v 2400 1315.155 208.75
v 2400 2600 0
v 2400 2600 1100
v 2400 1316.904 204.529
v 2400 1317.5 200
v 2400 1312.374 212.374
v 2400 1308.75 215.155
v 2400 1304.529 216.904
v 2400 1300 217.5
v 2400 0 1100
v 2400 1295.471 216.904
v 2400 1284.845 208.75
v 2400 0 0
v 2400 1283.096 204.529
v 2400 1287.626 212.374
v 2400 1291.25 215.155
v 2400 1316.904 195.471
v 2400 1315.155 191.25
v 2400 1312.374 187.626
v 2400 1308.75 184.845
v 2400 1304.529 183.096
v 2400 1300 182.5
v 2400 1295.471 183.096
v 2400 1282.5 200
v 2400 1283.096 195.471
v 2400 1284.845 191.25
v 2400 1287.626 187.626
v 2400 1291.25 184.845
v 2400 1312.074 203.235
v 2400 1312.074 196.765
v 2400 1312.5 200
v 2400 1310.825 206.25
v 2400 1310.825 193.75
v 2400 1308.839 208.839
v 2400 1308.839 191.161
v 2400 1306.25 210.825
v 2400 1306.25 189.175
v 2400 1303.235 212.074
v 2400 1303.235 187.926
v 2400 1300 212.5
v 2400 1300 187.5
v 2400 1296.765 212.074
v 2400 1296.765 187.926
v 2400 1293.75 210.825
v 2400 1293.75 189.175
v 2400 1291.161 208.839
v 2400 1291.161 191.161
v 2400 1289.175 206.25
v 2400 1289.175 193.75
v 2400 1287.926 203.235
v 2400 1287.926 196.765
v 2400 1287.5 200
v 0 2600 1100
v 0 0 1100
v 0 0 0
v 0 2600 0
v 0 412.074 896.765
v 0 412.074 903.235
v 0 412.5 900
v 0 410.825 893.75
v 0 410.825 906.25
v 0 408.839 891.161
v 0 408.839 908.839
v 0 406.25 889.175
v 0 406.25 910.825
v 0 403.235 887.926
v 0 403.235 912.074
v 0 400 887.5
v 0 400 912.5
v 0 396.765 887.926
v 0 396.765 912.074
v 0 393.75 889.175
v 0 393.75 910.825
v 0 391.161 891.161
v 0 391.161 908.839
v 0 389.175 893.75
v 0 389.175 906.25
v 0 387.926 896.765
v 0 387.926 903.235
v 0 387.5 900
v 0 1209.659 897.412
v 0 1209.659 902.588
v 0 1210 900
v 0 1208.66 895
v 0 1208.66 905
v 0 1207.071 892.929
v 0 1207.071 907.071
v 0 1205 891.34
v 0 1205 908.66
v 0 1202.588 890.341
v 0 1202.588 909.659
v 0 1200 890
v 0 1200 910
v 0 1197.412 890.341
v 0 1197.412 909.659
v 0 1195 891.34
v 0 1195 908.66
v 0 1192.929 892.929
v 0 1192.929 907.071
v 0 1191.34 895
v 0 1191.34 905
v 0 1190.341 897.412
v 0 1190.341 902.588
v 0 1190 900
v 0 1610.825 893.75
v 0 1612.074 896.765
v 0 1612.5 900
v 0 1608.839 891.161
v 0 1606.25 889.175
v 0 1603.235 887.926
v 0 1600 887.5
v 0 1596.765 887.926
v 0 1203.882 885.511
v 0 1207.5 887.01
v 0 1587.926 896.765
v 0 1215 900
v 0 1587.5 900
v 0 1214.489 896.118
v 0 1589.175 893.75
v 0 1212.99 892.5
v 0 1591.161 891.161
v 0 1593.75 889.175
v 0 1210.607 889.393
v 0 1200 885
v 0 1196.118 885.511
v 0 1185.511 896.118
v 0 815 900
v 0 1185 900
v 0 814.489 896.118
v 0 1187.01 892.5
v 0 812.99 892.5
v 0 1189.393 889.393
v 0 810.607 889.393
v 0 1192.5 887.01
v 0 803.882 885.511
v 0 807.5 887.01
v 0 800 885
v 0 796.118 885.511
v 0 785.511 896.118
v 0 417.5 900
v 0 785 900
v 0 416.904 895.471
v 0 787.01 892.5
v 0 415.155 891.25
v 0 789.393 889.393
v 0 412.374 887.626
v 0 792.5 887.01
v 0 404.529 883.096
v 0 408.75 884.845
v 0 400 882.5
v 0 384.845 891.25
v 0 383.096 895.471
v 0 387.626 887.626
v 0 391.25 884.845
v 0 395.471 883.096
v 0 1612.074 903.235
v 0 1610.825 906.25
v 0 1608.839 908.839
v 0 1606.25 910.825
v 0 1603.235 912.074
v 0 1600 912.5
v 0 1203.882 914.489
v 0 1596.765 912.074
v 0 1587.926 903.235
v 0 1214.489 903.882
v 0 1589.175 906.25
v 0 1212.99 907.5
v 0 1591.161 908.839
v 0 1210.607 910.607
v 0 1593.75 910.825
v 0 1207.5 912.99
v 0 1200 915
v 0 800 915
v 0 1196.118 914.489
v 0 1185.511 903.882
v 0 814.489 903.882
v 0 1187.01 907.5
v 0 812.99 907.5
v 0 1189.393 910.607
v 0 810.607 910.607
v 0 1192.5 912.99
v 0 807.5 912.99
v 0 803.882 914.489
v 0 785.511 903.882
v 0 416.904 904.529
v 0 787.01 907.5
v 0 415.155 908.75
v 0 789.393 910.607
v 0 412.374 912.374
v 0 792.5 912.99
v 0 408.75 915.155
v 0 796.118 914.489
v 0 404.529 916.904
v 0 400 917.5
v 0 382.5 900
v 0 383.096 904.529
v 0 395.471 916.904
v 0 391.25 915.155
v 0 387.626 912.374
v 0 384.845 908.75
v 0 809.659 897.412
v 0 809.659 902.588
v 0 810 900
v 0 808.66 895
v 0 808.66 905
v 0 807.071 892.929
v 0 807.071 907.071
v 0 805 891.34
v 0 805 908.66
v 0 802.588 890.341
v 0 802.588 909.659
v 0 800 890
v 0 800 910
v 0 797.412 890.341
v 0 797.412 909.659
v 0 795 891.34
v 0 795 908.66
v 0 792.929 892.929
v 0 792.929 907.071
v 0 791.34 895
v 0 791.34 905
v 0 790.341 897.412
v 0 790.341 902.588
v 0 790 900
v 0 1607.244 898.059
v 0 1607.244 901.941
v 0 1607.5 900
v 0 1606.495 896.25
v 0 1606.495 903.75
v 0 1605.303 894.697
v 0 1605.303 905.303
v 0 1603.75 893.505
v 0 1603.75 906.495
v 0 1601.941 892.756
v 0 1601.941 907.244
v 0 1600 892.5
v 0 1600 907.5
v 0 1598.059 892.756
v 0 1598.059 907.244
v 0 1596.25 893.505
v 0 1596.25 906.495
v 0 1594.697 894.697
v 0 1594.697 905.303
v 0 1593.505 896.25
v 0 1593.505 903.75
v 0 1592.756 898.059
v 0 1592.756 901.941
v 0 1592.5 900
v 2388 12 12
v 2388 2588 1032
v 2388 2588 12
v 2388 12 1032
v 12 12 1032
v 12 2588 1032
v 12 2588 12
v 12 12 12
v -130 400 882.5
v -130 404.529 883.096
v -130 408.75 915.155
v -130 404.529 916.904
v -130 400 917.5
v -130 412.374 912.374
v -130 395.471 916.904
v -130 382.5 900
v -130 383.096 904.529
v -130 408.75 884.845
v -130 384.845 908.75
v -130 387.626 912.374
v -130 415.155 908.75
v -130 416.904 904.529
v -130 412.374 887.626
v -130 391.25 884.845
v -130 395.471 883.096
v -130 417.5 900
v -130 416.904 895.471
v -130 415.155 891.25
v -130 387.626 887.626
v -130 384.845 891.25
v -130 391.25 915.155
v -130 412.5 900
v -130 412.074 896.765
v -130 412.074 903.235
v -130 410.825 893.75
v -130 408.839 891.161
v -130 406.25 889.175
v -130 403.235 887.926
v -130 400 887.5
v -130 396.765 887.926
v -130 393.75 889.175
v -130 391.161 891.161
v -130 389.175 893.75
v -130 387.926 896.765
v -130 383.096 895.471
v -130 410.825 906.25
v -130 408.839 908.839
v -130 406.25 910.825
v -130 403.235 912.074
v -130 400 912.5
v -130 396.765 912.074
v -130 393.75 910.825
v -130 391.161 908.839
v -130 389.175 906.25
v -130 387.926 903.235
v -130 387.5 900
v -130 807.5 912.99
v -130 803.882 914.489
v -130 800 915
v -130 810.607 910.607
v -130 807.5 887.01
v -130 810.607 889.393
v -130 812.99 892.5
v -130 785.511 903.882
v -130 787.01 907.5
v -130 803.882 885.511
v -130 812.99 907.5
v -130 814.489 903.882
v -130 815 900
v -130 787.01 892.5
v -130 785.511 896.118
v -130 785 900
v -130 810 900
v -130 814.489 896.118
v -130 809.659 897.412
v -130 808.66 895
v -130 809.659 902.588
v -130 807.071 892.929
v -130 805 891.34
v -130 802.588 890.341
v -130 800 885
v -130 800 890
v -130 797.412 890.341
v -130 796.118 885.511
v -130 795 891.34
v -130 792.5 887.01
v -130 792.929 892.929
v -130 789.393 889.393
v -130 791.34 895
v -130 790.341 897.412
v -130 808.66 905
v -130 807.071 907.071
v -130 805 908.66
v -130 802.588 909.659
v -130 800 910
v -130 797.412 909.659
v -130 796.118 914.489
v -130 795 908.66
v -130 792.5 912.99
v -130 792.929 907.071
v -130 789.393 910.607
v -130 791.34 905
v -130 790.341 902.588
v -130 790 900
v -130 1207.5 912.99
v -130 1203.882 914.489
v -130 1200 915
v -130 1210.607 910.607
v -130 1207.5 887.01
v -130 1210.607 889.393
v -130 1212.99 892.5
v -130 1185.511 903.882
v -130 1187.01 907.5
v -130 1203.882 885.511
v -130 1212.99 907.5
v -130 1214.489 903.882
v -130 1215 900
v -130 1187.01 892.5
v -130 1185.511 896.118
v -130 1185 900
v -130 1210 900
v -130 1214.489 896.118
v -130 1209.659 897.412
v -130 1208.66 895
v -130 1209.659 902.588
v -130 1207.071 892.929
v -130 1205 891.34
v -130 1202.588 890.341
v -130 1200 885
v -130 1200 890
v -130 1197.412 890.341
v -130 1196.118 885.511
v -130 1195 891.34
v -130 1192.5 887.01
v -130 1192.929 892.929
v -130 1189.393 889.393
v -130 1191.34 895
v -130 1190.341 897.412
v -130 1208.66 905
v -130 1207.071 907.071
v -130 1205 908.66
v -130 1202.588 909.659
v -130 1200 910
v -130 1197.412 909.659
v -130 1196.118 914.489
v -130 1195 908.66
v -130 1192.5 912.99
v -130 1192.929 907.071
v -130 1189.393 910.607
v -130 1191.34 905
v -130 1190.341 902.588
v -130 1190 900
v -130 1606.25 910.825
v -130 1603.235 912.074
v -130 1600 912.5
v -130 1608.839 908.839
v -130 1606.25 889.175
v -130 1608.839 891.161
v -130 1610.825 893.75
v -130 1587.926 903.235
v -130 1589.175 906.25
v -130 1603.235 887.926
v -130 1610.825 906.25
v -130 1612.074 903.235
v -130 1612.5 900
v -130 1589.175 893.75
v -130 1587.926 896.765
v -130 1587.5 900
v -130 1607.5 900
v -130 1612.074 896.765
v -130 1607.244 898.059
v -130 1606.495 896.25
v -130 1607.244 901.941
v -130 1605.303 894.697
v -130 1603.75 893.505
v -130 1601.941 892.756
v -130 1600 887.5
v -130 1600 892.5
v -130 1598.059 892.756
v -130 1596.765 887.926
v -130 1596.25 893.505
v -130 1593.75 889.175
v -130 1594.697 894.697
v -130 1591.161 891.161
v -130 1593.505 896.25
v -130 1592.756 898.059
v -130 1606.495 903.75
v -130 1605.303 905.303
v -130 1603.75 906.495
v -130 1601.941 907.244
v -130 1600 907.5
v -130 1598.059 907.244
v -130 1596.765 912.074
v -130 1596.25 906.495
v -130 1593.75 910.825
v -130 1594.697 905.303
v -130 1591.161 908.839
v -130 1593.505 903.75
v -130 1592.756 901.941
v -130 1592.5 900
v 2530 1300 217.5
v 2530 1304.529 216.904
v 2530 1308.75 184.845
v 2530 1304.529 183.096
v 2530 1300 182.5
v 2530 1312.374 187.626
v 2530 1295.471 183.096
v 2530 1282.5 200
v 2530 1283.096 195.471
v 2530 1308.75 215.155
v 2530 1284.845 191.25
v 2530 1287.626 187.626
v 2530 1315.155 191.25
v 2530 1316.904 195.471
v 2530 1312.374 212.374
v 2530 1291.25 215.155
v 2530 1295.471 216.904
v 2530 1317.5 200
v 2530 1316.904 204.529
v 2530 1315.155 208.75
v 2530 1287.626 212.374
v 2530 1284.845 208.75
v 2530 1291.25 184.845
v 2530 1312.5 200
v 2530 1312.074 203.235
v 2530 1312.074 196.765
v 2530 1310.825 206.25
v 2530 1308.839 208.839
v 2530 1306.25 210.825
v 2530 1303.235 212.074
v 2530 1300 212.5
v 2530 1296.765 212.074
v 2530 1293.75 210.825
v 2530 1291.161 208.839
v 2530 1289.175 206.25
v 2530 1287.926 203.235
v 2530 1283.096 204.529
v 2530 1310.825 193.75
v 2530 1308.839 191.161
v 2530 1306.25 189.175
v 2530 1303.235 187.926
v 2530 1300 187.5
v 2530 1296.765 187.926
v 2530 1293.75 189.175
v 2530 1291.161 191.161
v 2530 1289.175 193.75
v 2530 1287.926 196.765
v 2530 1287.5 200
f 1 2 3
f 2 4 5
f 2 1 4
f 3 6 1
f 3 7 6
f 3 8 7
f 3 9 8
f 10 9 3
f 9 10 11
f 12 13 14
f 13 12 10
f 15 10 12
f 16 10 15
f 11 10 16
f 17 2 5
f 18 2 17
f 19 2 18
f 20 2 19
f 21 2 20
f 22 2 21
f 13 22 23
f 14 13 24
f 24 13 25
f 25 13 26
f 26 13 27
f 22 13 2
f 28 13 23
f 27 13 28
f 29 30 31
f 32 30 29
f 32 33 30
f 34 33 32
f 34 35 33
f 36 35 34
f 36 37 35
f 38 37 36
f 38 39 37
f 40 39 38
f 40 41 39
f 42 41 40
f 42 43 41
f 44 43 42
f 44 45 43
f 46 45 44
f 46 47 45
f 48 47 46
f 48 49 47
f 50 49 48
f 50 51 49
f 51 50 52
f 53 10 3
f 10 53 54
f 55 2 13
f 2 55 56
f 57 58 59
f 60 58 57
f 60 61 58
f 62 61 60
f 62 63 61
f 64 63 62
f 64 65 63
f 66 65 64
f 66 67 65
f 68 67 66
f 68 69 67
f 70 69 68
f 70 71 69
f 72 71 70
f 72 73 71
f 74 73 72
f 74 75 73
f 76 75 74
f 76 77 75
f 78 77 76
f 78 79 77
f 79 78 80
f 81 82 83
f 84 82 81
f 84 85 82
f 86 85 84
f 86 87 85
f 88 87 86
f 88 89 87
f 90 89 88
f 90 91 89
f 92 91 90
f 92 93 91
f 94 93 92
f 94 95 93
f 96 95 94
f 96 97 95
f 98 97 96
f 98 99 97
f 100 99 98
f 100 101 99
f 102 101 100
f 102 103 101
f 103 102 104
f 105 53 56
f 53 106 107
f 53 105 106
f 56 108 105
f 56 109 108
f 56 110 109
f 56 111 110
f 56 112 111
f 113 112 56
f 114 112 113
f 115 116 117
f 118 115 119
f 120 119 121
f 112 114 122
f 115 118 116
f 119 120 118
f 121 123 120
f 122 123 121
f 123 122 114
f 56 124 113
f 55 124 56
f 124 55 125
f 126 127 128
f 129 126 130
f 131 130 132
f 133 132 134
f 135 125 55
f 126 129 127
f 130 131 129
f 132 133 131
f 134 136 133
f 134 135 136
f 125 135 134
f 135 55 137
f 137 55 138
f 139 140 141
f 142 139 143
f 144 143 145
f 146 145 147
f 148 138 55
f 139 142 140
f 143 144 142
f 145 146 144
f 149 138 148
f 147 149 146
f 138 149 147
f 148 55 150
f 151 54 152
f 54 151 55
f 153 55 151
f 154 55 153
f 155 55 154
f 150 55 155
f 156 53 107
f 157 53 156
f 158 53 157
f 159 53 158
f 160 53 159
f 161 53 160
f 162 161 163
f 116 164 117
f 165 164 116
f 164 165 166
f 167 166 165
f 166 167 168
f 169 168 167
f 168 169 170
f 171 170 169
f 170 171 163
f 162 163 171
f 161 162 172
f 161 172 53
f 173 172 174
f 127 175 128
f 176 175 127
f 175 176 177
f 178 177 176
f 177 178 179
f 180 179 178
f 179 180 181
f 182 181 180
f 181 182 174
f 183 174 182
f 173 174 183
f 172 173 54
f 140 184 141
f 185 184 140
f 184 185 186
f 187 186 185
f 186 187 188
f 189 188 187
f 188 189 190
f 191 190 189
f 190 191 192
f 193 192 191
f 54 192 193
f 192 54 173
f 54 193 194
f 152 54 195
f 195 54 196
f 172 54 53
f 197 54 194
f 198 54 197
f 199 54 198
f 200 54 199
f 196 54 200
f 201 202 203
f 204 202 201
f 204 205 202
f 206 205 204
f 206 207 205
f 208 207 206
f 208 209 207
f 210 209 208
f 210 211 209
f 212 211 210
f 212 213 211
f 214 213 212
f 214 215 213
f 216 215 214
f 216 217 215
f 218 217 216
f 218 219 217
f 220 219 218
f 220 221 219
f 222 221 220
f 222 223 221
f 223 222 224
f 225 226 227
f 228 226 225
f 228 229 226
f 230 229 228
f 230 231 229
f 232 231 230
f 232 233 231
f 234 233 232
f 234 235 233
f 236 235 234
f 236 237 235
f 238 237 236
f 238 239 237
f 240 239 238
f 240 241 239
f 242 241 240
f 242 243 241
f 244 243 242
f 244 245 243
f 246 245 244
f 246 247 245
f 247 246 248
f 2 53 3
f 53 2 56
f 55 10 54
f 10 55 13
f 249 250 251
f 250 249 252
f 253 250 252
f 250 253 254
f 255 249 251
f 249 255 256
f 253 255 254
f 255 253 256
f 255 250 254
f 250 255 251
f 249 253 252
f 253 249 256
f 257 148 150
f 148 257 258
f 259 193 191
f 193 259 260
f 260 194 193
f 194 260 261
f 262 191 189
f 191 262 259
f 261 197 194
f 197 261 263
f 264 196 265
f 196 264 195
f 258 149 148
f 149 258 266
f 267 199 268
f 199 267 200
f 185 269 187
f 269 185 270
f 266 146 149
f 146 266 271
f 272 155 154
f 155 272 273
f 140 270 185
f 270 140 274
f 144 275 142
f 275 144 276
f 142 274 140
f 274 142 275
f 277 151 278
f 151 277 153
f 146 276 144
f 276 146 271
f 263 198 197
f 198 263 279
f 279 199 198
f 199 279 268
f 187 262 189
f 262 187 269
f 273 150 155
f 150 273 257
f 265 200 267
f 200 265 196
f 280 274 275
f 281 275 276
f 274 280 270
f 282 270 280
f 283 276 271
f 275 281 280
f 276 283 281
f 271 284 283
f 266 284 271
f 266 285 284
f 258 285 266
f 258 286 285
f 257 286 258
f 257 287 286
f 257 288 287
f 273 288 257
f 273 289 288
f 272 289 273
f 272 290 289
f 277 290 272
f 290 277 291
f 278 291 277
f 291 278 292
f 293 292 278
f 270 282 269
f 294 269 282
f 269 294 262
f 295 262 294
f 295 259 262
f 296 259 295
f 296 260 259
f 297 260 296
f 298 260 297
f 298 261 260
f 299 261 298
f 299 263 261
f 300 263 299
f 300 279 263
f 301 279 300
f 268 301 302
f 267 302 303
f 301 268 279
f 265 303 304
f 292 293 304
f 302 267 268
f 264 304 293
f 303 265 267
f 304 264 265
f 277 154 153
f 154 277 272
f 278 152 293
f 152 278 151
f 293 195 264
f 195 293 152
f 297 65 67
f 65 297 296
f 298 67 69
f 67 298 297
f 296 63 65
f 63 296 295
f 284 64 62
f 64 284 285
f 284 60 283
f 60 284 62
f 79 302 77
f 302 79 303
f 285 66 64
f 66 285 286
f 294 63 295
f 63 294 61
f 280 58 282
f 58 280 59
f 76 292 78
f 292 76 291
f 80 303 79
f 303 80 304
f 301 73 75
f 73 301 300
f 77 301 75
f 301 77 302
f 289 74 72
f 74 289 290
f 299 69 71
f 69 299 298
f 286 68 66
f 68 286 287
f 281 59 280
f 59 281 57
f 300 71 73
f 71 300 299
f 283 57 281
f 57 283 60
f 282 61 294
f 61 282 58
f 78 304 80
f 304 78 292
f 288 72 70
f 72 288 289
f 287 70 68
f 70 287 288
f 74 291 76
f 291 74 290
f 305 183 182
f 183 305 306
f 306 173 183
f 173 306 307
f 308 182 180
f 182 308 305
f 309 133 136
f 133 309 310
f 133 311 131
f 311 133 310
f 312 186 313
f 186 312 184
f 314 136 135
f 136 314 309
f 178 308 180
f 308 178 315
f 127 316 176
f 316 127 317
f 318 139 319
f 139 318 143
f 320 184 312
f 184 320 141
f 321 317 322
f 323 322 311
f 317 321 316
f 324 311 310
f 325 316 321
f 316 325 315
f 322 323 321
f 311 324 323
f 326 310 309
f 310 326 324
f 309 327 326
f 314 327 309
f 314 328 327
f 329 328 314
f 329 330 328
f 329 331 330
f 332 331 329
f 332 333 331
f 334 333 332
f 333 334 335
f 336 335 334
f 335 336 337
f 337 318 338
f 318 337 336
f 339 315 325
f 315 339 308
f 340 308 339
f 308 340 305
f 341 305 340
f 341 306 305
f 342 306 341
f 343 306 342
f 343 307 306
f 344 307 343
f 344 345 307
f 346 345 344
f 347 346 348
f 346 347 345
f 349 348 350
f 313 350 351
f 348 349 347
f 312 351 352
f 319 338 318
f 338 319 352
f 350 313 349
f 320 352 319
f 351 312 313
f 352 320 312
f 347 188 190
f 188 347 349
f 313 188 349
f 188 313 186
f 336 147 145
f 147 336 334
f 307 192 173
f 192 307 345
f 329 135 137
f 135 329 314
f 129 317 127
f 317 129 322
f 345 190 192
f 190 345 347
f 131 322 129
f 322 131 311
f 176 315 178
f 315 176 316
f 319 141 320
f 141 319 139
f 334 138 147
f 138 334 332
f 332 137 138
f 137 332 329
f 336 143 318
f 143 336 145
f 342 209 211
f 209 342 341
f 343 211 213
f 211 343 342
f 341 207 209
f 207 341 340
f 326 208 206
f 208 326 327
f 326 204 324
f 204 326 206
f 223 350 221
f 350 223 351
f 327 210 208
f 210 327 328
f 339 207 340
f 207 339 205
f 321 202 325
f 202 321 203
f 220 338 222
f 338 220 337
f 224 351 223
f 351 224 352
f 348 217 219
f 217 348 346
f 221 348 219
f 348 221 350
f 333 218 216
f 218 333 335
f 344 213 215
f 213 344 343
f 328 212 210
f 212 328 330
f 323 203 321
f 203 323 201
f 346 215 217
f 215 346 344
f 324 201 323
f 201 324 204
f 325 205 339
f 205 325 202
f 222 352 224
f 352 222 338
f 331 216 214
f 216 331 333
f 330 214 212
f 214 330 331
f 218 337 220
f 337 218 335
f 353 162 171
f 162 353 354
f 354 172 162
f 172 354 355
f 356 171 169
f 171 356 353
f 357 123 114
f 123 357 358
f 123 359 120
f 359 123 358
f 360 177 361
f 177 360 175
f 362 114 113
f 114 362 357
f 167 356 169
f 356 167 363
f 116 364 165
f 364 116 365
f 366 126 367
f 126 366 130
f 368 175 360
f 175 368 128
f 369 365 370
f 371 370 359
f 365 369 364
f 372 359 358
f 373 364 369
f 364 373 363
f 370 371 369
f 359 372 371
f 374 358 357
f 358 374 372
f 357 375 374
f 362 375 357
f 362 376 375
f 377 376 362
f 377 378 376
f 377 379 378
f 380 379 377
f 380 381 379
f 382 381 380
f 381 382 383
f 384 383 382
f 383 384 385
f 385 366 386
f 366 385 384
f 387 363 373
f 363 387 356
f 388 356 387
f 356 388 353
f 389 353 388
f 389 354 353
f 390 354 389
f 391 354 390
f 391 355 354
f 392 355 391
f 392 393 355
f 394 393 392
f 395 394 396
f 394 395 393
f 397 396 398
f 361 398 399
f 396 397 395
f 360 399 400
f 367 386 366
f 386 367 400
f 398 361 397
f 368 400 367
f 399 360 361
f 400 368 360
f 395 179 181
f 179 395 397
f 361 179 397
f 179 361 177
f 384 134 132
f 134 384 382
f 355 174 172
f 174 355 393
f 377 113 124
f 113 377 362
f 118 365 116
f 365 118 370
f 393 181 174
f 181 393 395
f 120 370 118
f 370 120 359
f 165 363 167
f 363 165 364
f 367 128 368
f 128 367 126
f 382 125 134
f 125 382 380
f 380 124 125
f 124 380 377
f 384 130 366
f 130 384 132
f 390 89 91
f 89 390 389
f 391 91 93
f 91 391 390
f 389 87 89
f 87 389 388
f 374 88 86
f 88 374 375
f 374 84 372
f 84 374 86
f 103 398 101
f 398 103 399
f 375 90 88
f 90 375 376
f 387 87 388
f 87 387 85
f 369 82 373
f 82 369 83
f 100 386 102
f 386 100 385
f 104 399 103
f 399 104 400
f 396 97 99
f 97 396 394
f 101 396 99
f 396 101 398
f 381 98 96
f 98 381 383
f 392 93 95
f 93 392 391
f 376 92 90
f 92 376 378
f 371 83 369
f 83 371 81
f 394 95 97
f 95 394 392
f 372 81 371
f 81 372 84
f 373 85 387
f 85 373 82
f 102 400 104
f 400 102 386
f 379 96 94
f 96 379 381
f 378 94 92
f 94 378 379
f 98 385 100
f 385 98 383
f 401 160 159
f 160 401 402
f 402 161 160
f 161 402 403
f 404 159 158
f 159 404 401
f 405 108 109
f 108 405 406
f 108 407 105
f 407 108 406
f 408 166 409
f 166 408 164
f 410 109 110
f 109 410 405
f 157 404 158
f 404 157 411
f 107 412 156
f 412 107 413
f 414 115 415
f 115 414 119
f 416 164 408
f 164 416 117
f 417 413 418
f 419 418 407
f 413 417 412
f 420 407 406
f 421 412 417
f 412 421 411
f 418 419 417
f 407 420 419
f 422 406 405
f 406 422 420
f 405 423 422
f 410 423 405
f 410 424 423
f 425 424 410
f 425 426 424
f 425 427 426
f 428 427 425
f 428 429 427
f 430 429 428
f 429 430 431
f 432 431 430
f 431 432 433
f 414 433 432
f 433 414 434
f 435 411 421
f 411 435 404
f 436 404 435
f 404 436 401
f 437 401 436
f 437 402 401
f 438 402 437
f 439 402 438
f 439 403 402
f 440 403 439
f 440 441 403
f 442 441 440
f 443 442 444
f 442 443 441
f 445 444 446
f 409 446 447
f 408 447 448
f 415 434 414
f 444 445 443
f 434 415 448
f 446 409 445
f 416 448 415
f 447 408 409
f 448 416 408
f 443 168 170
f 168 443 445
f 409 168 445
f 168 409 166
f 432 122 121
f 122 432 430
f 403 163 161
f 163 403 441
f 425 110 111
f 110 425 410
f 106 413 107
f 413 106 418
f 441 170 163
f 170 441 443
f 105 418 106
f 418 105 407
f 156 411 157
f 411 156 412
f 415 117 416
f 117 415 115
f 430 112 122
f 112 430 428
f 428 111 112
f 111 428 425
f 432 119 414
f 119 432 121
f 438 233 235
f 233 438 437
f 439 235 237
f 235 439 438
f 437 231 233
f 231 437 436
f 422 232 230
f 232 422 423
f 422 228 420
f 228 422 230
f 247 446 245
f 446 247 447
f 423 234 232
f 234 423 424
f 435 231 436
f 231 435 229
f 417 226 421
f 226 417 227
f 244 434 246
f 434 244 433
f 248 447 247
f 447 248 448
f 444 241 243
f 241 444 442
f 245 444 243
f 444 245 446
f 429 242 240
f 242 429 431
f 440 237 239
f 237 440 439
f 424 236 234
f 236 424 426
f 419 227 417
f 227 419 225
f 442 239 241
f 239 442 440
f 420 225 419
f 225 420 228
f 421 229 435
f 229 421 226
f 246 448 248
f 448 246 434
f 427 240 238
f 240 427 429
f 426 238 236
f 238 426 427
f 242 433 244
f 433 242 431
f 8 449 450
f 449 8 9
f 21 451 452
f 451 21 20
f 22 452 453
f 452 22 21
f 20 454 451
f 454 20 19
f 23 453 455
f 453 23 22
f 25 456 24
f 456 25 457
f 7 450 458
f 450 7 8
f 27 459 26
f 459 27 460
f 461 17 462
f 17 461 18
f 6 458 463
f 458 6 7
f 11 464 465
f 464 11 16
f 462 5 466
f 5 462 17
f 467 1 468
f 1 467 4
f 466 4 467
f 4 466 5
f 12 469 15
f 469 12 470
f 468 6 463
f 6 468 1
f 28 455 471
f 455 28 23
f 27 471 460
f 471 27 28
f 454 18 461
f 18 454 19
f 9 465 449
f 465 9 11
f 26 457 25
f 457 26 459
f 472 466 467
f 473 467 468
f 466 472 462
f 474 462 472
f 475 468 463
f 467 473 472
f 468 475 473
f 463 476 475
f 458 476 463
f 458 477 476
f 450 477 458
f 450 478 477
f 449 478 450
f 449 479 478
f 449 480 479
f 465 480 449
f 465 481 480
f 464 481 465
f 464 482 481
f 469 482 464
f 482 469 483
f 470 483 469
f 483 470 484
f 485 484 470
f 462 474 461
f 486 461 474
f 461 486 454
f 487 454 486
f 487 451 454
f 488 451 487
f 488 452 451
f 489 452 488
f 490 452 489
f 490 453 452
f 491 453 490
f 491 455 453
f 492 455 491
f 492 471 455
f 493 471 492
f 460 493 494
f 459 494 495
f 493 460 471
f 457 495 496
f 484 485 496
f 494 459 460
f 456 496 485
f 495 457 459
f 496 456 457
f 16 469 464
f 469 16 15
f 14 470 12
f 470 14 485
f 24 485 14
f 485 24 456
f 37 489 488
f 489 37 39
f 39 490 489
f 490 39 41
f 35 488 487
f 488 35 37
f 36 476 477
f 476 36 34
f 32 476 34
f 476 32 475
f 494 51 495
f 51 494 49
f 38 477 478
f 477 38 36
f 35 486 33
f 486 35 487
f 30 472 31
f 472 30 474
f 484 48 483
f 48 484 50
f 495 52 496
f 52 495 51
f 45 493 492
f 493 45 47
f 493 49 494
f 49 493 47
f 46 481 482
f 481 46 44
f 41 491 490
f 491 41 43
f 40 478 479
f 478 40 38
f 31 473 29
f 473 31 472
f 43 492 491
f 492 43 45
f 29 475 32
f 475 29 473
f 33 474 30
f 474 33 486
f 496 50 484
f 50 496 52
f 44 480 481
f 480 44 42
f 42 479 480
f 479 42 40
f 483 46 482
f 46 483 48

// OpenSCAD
// file: ../params.scad
// Shared millimetre parameters. Keep in lockstep with freecad/params.py.
// Module scale: 150 kg/day wet train. Walls are CPVC sheet, not metal.

$fn = 36;

WALL        = 12;     // CPVC sheet thickness
FLOOR       = 16;     // floor plate (trough sits on this)

// LEACH CSTR 1 — inside liquor box
CSTR_L      = 2000;
CSTR_W      = 1200;
CSTR_H      = 1400;   // liquid + freeboard
FREEBOARD   = 200;

// CSTR 2 weir (same vessel, +X wall)
WEIR_W      = 450;
WEIR_CREST  = CSTR_H - FREEBOARD;   // from inner floor
WEIR_SLOT_H = 80;
WEIR_LIP    = 120;    // external spout projection

// CSTR 3 floor auger — injection-molded PVC / FG
AUGER_D     = 140;    // flight OD
AUGER_SHAFT = 40;
AUGER_PITCH = 110;
AUGER_TROUGH_W = 180;
AUGER_TROUGH_H = 110;
AUGER_OFFSET_Y = 280; // trough centreline from inner -Y wall
AUGER_INCLINE  = 28;  // deg, lifts out of liquor toward +X

// mixer / nozzles (lid)
MIXER_D     = 50;
GAS_D       = 80;     // acid-gas takeoff
DROP_X      = 80;     // inner-X of shred drop slot
DROP_L      = 400;
DROP_W      = 250;
DROP_COAM   = 80;     // raised coaming around the slot

// LEACHATE PUMP / coarse strainer — −X wall, opposite the weir
PUMP_D      = 80;     // DN80
PUMP_Z      = 450;    // centreline above inner floor (submerged)
PUMP_Y      = 900;    // centreline from inner −Y (away from auger)
STRAINER_L  = 180;
STRAINER_W  = 140;
STRAINER_H  = 160;

// mezzanine feed train
MEZZ_H      = 2200;   // platform top above tank outer floor
MEZZ_L      = 1600;   // platform length in −X
MEZZ_THK    = 12;
HOPPER_L    = 700;
HOPPER_W    = 600;
HOPPER_H    = 800;
SHRED_L     = 500;
SHRED_W     = 500;
SHRED_H     = 450;
CONV_W      = 240;
CONV_H      = 120;
CONV_PLATE  = 6;      // trough plate
CONV_FLANGE = 40;
CONV_SPRING_D = 50;
CONV_SPRING_H = 80;
CONV_BOLT   = 10;     // M10 clearance
CONV_LEN    = 1800;   // default standalone length; plant instance is computed
DUST_D      = 150;    // dust-hood outlet to DUST header
AUGER_LIFT_L = 700;

// dewater belts + split (Phase A 4–6)
FDEW_L      = 1800;
FDEW_W      = 450;
FDEW_H      = 80;
FDEW_RISE   = 120;    // solids end higher so liquor runs back to weir
SDEW_L      = 1400;
SDEW_W      = 220;
SDEW_H      = 80;
SPLIT_L     = 600;
SPLIT_W     = 500;
SPLIT_H     = 400;
STUB_L      = 400;
STUB_W      = 300;
STUB_H      = 250;

// EW funnel cell
EW_L        = 600;    // along aisle (overflow direction)
EW_W        = 420;    // anode-cathode depth
EW_H        = 650;    // rectangular body
EW_FUNNEL_H = 220;
EW_VALVE_D  = 50;
EW_VALVE_L  = 60;
EW_MEM_T    = 4;      // CEM
EW_SLOT     = 10;     // membrane cassette slot
EW_PITCH    = 750;    // aisle spacing, centre to centre
AISLE_X0    = 200;
AISLE_Y     = -(EW_W + 2*WALL) - 400;
AISLE_Z     = 400;
BUND_H      = 150;
BUND_PAD    = 250;
SUMP_L      = 400;
SUMP_W      = 400;
SUMP_H      = 300;
VDF_D       = 700;
VDF_L       = 900;
PAIL_W      = 180;
HDR_D       = 80;
HDR_Z       = 1400;
PYRO_D      = 320;
PYRO_L      = 2800;

// Campus envelopes — lockstep with freecad/params.py
FARM_X=12000; FARM_Y=8000; FARM_L=12000; FARM_W=8000; FARM_H=4500;
FAB_X=12000;  FAB_Y=-6000; FAB_L=8000;   FAB_W=6000;  FAB_H=4000;
HAB_X=-8000;  HAB_Y=8000;  HAB_L=8000;   HAB_W=6000;  HAB_H=3200;
CRYO_X=-6000; CRYO_Y=-4000; CRYO_L=4000; CRYO_W=3000; CRYO_H=3000;
MFG_X=2000;   MFG_Y=9000;  MFG_L=6000;   MFG_W=4000;  MFG_H=3500;

LIFE_Z_GREY=900; LIFE_Z_UPW=1100; LIFE_Z_ETCH=1300;
LIFE_Z_O2=2800; LIFE_Z_N2=3000; LIFE_Z_CO2=3200;
LIFE_D_GREY=50; LIFE_D_UPW=40; LIFE_D_ETCH=32;
LIFE_D_GAS=25; LIFE_D_CO2=40;
// main file
// WET BENCH — W1–W5. No floor drain.
include <../params.scad>;
$fn = 24;
L=2400; W=2600; H=1100; T=12;

module stub(d, l=130) {
    difference() {
        cylinder(h=l, d=d+10);
        translate([0,0,-1]) cylinder(h=l+2, d=d);
    }
}

module mfg_wet_bench() {
    difference() {
        cube([L, W, H]);
        translate([T, T, T]) cube([L-2*T, W-2*T, H-80]);
    }
    translate([0, 400, 900]) rotate([0,-90,0]) stub(25); // W1 UPW
    translate([0, 800, 900]) rotate([0,-90,0]) stub(20); // W2 HCl
    translate([0, 1200, 900]) rotate([0,-90,0]) stub(20); // W3 NaOH
    translate([0, 1600, 900]) rotate([0,-90,0]) stub(15); // W4 N2
    translate([L, W/2, 200]) rotate([0,90,0]) stub(25);   // W5 etch
}

mfg_wet_bench();
